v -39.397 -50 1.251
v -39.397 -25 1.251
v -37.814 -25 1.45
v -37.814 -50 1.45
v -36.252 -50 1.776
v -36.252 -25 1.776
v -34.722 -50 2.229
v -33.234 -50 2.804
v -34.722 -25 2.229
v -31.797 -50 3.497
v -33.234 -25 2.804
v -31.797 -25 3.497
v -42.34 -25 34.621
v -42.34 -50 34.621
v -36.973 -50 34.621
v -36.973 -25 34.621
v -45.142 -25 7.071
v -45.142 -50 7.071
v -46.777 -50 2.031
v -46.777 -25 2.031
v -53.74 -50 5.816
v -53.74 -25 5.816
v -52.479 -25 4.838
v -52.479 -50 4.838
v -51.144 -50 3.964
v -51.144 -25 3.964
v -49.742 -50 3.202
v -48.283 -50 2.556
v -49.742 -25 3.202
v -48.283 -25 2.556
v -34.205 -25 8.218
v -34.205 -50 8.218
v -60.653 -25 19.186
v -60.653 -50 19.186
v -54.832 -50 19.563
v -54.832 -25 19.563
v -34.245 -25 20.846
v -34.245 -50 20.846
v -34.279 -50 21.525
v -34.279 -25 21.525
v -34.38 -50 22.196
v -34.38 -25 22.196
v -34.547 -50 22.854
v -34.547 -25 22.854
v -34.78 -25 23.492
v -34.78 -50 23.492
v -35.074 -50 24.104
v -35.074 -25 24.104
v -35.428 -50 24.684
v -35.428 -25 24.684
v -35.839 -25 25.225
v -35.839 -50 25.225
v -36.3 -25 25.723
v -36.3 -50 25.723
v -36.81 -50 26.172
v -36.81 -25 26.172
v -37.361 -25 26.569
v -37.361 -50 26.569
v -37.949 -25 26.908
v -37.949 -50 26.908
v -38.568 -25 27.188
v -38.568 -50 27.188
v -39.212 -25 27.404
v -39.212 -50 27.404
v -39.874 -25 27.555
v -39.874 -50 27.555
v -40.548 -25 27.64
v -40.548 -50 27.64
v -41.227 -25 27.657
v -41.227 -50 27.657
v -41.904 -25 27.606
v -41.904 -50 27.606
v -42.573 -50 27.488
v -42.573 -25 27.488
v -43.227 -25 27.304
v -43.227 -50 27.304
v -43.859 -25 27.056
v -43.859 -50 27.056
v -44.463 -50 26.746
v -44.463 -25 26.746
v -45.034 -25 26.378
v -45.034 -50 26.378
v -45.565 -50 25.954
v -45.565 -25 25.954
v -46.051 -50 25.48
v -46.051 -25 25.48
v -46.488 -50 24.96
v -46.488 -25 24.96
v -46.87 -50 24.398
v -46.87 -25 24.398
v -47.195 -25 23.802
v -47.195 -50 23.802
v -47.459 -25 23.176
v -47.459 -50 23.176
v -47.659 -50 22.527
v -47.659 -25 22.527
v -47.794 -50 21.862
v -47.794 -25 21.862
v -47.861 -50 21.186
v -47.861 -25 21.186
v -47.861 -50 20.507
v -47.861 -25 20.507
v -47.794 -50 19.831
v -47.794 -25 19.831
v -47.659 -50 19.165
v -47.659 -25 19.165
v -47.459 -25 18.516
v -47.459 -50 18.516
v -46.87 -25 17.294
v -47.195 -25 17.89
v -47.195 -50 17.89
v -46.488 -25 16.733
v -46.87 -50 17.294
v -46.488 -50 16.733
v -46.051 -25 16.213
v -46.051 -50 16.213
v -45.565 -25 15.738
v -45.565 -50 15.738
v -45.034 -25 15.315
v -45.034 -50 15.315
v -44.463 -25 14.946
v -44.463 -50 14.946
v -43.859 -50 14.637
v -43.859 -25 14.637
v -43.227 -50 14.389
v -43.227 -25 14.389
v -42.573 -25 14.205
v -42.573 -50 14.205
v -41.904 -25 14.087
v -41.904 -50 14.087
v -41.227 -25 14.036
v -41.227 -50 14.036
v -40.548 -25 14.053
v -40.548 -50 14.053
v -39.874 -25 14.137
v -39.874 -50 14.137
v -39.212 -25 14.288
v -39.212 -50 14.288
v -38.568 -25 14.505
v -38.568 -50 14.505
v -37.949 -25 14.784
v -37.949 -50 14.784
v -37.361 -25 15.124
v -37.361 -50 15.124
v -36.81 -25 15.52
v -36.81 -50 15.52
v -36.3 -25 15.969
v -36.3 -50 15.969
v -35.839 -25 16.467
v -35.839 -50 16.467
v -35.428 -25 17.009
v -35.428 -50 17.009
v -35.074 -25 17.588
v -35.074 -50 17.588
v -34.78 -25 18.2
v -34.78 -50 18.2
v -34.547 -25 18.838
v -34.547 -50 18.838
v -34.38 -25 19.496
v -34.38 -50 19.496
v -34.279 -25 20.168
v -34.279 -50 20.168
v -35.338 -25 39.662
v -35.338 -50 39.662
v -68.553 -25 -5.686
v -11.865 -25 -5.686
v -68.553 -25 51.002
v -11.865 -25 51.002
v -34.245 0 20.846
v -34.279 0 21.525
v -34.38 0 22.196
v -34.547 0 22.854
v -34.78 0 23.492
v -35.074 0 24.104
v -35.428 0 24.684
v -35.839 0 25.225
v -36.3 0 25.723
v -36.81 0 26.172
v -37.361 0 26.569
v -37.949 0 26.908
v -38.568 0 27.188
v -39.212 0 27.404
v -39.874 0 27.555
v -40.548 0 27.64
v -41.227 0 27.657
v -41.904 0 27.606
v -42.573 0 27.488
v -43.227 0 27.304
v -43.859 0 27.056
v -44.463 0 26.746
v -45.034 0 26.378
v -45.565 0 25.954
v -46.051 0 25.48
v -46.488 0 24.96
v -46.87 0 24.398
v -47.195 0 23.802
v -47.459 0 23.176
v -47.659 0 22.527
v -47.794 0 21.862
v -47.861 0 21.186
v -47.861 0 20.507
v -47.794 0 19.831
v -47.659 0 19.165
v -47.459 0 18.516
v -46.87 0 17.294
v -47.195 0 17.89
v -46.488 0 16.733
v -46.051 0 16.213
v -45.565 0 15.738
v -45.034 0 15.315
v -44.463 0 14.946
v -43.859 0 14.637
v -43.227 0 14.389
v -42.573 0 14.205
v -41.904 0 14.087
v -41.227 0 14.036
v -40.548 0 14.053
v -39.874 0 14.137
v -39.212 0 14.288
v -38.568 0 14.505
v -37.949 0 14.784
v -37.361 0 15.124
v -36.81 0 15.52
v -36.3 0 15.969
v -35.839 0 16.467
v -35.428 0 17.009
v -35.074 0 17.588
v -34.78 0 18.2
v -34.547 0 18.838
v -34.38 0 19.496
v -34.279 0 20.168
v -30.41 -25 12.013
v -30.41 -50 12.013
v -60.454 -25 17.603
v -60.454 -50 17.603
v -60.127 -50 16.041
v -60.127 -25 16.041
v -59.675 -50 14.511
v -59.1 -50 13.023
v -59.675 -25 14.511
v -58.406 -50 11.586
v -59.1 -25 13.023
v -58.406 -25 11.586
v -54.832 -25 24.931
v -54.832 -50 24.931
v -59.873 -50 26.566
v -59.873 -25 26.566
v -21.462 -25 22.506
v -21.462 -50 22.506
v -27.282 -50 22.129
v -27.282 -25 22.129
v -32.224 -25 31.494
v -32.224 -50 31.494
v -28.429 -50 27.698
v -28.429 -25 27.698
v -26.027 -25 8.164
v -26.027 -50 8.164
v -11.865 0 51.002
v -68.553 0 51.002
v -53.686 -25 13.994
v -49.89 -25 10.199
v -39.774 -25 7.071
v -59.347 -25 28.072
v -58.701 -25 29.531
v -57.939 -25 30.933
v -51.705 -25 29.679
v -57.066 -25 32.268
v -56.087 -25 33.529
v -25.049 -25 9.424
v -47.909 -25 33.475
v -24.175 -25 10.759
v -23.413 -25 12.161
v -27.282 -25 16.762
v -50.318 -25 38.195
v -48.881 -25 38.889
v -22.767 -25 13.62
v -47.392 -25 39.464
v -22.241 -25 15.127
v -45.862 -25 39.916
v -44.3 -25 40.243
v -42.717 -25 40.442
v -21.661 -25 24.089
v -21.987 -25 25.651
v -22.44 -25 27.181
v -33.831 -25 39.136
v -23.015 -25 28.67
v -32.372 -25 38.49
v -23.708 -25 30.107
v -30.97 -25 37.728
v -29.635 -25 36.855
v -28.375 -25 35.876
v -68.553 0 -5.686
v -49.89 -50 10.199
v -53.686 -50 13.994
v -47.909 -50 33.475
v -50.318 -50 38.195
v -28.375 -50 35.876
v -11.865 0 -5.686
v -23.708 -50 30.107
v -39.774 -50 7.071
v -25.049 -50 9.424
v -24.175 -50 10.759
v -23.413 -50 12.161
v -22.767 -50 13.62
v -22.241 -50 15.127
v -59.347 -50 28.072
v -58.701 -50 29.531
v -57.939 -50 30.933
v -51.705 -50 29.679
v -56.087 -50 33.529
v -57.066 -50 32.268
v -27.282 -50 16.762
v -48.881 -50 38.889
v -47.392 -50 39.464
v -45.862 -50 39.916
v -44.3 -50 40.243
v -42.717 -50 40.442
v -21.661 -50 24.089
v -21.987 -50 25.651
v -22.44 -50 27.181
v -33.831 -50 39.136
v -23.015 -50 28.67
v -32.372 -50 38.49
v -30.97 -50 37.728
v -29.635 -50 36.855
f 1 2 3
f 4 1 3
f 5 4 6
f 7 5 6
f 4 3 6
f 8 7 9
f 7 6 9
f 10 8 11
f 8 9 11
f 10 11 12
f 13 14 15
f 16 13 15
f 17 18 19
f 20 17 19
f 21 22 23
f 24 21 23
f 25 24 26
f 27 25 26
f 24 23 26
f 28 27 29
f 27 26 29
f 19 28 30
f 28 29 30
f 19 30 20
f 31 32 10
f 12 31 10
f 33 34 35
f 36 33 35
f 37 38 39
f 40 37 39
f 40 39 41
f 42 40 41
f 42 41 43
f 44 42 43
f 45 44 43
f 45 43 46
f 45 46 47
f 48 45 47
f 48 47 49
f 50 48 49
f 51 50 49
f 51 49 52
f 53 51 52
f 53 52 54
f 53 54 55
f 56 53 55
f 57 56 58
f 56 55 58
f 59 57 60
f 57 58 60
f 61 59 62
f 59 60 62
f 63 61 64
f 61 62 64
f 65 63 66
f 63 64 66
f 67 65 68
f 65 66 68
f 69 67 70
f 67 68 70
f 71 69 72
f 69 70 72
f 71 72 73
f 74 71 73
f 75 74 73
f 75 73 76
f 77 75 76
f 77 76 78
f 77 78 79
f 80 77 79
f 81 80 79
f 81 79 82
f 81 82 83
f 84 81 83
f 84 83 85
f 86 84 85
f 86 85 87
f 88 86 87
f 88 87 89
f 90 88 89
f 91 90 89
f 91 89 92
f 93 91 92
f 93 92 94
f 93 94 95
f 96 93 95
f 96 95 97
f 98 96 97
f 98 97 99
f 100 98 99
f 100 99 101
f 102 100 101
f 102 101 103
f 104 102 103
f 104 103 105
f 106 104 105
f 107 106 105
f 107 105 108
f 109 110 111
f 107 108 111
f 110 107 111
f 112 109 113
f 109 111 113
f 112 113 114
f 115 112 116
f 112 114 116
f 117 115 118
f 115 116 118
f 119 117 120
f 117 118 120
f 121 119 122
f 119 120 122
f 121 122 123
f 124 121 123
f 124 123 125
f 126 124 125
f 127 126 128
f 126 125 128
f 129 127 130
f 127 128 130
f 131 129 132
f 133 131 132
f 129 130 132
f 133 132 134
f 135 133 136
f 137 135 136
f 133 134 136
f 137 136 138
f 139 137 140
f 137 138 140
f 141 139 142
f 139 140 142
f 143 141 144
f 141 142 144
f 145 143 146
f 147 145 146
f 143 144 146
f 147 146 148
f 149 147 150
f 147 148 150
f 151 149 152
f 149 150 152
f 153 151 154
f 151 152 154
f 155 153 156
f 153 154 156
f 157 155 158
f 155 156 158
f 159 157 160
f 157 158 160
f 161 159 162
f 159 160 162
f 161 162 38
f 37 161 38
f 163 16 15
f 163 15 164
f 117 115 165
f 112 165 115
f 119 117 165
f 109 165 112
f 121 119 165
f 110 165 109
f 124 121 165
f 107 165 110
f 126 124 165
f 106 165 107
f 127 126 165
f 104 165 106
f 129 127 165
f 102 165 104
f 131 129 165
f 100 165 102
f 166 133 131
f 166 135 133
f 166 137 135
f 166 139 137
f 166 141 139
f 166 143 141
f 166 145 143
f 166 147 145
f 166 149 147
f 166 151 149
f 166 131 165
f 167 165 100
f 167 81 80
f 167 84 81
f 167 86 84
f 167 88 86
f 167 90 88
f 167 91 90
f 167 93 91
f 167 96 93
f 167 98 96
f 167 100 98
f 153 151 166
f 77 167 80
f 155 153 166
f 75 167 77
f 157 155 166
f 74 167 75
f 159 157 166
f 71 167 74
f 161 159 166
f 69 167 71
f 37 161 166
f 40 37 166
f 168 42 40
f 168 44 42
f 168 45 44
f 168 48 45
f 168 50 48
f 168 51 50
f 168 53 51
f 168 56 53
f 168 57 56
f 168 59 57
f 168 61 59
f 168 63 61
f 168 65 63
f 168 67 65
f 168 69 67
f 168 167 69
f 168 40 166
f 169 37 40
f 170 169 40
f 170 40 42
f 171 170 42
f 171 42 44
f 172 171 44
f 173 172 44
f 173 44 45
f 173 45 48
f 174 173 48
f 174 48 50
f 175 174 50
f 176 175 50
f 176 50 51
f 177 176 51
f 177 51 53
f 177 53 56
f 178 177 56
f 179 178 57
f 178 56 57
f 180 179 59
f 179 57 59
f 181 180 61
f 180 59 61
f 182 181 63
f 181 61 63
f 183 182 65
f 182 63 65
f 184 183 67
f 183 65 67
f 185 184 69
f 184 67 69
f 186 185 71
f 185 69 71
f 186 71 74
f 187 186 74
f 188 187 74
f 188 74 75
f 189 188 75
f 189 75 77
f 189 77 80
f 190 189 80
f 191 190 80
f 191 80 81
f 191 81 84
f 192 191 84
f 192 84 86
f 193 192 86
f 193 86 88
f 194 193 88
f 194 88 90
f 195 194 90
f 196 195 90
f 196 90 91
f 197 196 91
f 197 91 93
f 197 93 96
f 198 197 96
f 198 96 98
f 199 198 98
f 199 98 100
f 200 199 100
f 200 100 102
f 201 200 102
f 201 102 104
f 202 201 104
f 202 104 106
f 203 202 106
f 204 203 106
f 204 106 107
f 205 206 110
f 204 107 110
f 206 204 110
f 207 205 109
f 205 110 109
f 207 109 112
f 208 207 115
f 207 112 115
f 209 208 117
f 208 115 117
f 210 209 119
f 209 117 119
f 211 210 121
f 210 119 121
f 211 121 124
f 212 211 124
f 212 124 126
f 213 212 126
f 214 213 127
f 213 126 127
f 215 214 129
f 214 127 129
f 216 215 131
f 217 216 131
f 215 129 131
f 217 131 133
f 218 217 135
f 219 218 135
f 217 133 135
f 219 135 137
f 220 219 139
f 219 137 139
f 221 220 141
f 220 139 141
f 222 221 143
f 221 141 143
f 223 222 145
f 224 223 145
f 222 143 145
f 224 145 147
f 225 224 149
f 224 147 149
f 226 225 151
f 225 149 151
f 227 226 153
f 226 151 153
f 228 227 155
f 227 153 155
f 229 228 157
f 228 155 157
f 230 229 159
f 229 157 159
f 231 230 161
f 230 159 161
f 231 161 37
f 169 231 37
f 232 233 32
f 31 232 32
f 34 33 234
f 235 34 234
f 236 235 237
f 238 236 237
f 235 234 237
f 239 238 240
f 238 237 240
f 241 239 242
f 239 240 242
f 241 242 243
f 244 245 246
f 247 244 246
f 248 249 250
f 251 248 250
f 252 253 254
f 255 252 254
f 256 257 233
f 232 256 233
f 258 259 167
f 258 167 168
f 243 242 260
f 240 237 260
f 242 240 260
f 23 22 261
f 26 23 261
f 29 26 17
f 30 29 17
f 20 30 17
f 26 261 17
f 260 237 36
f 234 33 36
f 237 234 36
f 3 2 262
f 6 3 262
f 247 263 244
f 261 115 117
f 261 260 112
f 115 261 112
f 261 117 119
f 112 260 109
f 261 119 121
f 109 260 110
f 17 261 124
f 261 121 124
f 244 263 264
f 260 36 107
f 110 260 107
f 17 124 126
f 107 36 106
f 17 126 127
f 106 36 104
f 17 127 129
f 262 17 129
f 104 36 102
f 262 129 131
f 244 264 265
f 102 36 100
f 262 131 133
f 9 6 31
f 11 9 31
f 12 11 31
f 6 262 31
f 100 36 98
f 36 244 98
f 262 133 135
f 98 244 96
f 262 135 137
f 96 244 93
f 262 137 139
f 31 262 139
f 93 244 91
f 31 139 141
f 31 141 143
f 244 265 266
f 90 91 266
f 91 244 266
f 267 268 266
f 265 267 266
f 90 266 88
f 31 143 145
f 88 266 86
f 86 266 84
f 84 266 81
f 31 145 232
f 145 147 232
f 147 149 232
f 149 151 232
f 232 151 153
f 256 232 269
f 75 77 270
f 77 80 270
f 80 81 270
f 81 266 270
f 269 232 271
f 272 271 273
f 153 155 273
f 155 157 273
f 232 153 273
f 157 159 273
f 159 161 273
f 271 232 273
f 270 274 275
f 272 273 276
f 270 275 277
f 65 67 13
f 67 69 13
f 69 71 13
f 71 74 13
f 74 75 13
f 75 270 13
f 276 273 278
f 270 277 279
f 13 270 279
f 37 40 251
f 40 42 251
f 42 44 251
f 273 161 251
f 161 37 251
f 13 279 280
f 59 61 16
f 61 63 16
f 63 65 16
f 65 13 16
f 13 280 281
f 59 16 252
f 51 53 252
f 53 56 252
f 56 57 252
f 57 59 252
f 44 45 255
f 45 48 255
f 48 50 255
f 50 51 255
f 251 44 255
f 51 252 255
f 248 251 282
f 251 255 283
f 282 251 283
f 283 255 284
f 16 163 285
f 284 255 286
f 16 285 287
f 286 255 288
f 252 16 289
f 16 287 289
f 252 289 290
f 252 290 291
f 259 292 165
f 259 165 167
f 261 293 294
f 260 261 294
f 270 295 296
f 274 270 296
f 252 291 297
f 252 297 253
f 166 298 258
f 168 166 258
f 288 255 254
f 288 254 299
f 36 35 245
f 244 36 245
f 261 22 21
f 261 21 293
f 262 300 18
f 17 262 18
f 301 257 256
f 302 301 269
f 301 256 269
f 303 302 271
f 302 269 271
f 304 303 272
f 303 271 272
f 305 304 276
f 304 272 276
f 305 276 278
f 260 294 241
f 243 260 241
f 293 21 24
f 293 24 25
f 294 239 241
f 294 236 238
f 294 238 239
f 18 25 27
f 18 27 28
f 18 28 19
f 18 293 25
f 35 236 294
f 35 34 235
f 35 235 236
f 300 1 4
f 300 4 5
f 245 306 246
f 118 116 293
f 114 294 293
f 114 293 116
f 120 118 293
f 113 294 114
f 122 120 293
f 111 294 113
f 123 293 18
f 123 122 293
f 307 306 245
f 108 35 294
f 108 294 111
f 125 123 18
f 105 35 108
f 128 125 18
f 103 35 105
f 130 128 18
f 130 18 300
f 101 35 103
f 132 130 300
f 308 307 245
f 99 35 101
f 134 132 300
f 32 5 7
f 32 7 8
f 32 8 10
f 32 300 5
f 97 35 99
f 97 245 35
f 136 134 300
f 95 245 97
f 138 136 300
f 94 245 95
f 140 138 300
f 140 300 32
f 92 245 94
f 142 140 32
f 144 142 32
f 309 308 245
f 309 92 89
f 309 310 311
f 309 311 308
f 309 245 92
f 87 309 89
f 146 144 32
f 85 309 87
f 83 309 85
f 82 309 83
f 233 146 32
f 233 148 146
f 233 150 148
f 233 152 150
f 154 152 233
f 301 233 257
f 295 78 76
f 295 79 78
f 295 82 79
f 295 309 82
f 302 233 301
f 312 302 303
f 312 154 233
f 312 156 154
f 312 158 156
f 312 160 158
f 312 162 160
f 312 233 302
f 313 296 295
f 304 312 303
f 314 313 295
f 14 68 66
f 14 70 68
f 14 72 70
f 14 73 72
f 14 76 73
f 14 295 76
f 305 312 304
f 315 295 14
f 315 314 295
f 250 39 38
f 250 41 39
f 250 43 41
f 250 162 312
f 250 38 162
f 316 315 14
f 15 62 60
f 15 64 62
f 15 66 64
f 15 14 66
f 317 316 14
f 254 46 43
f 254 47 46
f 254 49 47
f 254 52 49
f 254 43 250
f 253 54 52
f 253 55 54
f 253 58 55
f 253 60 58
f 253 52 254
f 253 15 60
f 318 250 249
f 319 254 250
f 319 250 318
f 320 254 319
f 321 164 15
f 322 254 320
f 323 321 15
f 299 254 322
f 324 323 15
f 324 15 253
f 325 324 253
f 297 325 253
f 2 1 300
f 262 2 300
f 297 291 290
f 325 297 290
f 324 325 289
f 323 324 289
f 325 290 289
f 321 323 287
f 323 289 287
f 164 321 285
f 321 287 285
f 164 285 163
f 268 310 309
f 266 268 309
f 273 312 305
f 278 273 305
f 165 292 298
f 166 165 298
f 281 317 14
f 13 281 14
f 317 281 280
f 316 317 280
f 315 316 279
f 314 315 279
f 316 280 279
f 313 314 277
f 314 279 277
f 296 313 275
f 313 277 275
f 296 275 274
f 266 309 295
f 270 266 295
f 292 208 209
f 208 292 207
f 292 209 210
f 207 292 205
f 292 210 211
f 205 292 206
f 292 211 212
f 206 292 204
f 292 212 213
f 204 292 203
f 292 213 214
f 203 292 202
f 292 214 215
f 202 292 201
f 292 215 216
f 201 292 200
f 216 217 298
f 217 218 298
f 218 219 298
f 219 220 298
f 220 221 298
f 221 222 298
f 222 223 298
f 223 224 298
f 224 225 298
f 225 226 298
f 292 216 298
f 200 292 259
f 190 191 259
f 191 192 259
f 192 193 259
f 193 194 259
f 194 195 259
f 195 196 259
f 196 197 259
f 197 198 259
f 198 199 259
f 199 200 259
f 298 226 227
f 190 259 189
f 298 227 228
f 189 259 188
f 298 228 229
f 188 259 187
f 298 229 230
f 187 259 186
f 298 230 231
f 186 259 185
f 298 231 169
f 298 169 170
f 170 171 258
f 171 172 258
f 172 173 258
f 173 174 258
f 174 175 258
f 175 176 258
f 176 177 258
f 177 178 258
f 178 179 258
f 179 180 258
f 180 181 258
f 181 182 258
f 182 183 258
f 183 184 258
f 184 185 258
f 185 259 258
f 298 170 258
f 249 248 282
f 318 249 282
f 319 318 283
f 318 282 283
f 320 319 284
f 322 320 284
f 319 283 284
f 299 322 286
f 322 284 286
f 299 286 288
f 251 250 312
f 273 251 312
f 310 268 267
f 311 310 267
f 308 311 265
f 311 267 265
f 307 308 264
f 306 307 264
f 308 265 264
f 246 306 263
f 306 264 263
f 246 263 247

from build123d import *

# Parameters (mm, degrees)
F0_W            = 56.6879622638
F0_H            = 56.6879622638
F1_DEPTH        = 25
F2_R            = 19.6657684011
F3_DEPTH        = 25
F4_R            = 6.8124557353
F5_DEPTH        = 50.001
F7_DEPTH        = 50.001
F7_COPIES_COUNT = 8


# Not quite as in the source:
# - a pattern or mirror of a feature is missing from the dataset's text; its kind, count and spacing are read off the source's solid


with BuildPart() as f1:
    # F0 (on Front) → F1 (new body)
    with BuildSketch(Plane.XZ):
        with Locations((-40.2088612318, 22.6584635675)):
            Rectangle(F0_W, F0_H)
    extrude(amount=F1_DEPTH)


with BuildPart() as f3:
    # F2 (on face) → F3 (new body)
    with BuildSketch(Plane.XZ.offset(25)):
        with Locations((-41.0571657121, 20.8462141454)):
            Circle(F2_R)
    extrude(amount=F3_DEPTH)


with BuildPart() as f5_tool:
    # F4 (on face) → F5 (new body, through all)
    with BuildSketch(Plane.XZ.offset(50)):
        with Locations((-41.0571657121, 20.8462141454)):
            Circle(F4_R)
    extrude(amount=-F5_DEPTH)


with BuildPart() as f1_1:
    add(f1.part)

    # F5: cut by f5_tool
    add(f5_tool.part, mode=Mode.SUBTRACT)


with BuildPart() as f3_1:
    add(f3.part)

    # F5: cut by f5_tool
    add(f5_tool.part, mode=Mode.SUBTRACT)

    # F6 (on face) → F7 (cut, through all)
    with BuildSketch(Plane.XZ.offset(50)):
        Polygon((-19.0042369068, 22.665174678), (-27.28226409, 22.1291541798), (-27.28226409, 16.7617611587), (-19.8002401739, 14.3349375576), align=None)
    f7 = extrude(amount=-F7_DEPTH, mode=Mode.SUBTRACT)

    # F7_copies: F7 ×8 about axis
    f7_copies_axis = Axis((-41.057166, 0, 20.846214), (0, 1, 0))
    for i in range(1, F7_COPIES_COUNT):
        add(f7.rotate(f7_copies_axis, i * 360 / F7_COPIES_COUNT), mode=Mode.SUBTRACT)


solid = Compound([f1_1.part, f3_1.part])
